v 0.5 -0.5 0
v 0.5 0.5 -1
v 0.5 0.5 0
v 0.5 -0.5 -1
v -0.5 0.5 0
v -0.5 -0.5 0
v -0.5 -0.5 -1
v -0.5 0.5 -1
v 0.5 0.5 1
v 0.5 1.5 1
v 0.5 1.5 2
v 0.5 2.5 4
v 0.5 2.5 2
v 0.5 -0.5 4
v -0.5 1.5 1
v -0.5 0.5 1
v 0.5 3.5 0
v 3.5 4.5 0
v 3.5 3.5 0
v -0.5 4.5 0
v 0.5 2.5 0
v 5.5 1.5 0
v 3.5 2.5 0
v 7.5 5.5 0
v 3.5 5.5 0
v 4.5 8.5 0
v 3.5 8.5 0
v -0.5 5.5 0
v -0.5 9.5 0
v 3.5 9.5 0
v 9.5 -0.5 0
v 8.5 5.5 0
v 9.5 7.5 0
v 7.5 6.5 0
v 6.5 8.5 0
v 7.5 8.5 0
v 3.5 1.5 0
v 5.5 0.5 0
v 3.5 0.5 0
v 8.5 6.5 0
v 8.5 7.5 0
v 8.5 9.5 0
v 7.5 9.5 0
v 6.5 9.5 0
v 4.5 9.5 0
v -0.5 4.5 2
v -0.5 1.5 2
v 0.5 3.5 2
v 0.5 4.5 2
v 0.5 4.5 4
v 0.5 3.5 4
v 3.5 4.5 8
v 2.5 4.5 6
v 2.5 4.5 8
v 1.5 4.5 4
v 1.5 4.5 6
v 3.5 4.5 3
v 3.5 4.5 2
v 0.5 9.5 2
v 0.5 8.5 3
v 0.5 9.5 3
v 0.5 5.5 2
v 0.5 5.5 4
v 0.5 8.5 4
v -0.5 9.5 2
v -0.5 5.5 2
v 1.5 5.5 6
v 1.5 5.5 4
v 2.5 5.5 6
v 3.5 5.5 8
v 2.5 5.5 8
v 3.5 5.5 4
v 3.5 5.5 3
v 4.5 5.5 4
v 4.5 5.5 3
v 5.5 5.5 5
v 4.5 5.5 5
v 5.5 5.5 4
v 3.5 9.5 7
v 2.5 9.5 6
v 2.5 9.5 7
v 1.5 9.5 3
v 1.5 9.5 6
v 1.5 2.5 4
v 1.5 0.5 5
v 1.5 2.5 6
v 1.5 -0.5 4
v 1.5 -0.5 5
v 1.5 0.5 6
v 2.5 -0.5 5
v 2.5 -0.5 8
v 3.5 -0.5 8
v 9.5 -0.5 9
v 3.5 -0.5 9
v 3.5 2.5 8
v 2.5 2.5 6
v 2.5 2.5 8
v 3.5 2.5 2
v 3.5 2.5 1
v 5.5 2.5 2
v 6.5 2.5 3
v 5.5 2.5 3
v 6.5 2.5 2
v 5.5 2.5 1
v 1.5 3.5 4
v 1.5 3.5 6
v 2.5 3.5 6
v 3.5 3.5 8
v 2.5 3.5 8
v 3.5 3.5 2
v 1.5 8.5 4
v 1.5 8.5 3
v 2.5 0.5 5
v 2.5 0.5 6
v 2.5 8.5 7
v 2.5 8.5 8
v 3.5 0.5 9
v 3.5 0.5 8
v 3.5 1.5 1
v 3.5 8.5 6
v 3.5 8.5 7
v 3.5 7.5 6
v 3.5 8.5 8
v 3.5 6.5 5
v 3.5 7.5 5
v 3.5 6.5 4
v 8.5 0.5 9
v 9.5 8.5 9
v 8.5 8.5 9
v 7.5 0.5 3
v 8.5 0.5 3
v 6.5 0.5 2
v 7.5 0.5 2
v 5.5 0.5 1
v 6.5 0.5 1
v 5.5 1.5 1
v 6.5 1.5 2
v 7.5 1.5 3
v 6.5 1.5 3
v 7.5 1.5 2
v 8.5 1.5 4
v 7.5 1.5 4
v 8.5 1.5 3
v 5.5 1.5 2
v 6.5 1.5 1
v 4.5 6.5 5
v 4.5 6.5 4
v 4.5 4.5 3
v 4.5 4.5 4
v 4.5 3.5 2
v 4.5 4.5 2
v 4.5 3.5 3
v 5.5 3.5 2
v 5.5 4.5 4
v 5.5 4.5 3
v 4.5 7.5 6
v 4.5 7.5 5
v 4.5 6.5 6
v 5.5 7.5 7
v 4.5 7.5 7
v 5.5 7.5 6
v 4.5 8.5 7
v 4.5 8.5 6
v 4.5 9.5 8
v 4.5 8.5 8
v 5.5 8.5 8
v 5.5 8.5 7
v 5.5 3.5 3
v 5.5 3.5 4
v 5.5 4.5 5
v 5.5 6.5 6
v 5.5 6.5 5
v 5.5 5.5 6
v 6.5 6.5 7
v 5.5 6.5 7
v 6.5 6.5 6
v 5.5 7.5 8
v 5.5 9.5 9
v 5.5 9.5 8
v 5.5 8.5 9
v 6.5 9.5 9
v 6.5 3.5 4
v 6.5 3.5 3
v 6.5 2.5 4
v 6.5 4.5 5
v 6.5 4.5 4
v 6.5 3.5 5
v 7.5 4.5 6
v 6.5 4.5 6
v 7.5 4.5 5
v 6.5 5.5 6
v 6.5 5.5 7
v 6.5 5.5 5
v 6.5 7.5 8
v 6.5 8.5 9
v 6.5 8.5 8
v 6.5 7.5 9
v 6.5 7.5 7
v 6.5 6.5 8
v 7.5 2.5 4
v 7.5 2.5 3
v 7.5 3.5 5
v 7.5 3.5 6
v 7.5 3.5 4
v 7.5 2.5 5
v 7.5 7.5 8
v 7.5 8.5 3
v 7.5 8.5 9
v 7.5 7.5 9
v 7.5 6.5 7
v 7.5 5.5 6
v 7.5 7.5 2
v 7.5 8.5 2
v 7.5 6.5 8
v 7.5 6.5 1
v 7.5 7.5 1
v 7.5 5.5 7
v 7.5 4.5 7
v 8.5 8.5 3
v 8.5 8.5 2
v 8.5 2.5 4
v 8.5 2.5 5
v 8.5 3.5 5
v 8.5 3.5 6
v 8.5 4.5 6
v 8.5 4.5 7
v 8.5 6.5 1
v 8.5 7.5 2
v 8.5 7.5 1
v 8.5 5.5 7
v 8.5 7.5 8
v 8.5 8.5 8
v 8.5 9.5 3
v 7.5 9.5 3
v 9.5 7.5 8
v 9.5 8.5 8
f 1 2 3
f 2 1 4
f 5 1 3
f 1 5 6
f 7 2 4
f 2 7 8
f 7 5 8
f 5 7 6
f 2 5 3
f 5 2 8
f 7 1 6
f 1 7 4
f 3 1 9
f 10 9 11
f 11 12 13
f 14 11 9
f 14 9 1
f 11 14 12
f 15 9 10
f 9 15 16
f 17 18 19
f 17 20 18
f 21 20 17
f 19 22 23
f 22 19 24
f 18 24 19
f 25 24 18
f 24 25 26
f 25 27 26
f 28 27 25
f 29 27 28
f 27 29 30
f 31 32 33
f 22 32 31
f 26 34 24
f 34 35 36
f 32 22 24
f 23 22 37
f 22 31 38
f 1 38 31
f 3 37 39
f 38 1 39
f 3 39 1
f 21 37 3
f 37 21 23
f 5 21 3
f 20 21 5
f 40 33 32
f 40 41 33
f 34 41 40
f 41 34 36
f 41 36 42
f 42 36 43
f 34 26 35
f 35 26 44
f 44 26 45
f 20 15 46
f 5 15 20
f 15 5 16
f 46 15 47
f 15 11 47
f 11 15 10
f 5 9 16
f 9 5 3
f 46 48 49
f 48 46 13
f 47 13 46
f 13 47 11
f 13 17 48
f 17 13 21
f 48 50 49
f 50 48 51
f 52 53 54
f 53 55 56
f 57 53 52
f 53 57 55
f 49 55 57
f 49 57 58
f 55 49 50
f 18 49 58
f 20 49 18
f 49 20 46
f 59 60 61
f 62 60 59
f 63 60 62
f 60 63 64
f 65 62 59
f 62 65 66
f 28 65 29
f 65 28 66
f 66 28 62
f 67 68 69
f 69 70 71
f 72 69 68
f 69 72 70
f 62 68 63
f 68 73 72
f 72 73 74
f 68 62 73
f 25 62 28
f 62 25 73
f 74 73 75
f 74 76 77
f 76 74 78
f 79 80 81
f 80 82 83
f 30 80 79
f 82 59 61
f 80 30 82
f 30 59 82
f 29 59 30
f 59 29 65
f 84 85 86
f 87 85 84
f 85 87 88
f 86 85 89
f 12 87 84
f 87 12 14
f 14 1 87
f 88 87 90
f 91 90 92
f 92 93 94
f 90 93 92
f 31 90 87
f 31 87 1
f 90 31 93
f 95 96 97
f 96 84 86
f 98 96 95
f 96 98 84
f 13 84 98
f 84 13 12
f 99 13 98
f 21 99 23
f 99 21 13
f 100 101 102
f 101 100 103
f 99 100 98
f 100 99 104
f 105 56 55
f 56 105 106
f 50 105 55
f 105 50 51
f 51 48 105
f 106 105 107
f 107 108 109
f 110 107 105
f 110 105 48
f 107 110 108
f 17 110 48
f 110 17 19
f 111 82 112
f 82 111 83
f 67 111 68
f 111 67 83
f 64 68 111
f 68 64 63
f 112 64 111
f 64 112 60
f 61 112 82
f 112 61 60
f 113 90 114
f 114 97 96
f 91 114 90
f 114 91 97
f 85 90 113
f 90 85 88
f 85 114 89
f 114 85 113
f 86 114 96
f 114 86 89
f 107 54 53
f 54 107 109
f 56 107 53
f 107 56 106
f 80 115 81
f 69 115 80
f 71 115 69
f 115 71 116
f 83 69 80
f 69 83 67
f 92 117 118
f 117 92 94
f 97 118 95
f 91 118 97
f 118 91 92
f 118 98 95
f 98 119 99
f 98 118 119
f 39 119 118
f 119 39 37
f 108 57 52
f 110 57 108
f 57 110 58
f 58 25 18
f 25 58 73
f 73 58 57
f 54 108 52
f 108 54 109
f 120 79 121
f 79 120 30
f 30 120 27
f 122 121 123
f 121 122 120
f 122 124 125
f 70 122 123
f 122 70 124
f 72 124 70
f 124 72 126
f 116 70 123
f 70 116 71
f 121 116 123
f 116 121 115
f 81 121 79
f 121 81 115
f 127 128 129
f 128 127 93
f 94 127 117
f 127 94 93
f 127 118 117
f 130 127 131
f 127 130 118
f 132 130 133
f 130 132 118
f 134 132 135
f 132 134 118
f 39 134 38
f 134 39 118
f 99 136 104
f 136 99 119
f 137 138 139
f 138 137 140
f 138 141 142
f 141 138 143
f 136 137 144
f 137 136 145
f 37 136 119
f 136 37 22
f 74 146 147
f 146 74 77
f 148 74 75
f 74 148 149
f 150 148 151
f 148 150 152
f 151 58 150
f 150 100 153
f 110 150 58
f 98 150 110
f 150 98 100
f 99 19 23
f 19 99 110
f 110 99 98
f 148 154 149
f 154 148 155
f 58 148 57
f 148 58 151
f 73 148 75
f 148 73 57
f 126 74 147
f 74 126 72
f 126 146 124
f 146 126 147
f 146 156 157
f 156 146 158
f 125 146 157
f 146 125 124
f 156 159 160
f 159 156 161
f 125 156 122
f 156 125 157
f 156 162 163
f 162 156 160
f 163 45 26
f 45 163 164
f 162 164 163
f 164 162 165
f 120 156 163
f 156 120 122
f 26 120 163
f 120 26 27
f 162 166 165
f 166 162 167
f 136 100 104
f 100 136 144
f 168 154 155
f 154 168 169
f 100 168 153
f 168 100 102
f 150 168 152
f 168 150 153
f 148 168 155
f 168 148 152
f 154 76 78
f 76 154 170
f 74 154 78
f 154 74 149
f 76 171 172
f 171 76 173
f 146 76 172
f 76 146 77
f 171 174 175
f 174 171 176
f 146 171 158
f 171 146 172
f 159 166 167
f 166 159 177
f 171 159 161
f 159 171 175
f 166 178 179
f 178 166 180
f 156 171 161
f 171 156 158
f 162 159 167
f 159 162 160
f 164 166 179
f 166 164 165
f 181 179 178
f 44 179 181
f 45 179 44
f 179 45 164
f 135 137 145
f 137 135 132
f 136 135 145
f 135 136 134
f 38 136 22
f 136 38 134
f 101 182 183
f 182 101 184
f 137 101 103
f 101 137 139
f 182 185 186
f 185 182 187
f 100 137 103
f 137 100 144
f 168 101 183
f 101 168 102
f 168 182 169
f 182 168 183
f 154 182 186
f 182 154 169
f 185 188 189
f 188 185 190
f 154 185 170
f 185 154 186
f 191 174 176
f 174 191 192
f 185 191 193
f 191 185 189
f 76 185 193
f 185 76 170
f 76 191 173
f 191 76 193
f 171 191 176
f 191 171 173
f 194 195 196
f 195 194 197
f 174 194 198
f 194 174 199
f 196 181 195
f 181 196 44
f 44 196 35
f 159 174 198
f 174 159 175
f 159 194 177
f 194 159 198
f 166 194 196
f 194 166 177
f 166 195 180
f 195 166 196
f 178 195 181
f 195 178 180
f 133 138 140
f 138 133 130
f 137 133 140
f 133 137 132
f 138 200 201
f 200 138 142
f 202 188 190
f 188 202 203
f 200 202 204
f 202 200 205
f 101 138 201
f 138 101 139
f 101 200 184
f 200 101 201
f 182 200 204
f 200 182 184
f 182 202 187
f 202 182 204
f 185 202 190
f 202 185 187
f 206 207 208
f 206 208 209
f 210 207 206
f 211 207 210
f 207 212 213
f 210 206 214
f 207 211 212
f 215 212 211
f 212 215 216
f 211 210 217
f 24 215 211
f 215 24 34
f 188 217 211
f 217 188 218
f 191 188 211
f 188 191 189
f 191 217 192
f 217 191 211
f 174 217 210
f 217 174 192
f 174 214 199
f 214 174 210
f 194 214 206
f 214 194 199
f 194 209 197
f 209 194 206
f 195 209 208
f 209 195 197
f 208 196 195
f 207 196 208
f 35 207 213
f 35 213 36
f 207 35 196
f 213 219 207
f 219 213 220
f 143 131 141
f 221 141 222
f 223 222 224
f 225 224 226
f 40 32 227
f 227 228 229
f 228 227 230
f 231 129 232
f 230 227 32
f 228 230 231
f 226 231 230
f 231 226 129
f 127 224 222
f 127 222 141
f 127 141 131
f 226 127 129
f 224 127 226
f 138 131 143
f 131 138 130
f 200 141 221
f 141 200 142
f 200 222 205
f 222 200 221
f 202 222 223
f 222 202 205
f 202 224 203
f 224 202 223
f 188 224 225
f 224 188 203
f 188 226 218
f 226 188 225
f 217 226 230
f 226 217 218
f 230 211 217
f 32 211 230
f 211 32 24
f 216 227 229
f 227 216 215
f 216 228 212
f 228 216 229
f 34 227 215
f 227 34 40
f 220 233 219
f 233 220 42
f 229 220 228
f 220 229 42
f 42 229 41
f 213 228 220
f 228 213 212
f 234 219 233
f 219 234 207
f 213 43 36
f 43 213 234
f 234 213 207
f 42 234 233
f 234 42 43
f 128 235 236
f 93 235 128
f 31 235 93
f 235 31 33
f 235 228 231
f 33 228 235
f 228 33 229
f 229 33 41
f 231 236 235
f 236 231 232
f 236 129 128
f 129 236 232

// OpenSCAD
union() {
    translate([0, 0, -0.5]) color([1, 0, 0]) cube([1, 1, 1], center=true);
    translate([0, 1, 0.5]) cube([1, 1, 1], center=true);
    translate([0, 2, 1.0]) cube([1, 1, 2], center=true);
    translate([0, 3, 1.0]) cube([1, 1, 2], center=true);
    translate([0, 4, 1.0]) cube([1, 1, 2], center=true);
    translate([0, 6, 1.0]) cube([1, 1, 2], center=true);
    translate([0, 7, 1.0]) cube([1, 1, 2], center=true);
    translate([0, 8, 1.0]) cube([1, 1, 2], center=true);
    translate([0, 9, 1.0]) cube([1, 1, 2], center=true);
    translate([1, 0, 2.0]) cube([1, 1, 4], center=true);
    translate([1, 1, 2.0]) cube([1, 1, 4], center=true);
    translate([1, 2, 2.0]) cube([1, 1, 4], center=true);
    translate([1, 4, 2.0]) cube([1, 1, 4], center=true);
    translate([1, 6, 2.0]) cube([1, 1, 4], center=true);
    translate([1, 7, 2.0]) cube([1, 1, 4], center=true);
    translate([1, 8, 2.0]) cube([1, 1, 4], center=true);
    translate([1, 9, 1.5]) cube([1, 1, 3], center=true);
    translate([2, 0, 2.5]) cube([1, 1, 5], center=true);
    translate([2, 1, 3.0]) cube([1, 1, 6], center=true);
    translate([2, 2, 3.0]) cube([1, 1, 6], center=true);
    translate([2, 4, 3.0]) cube([1, 1, 6], center=true);
    translate([2, 6, 3.0]) cube([1, 1, 6], center=true);
    translate([2, 7, 3.0]) cube([1, 1, 6], center=true);
    translate([2, 8, 3.0]) cube([1, 1, 6], center=true);
    translate([2, 9, 3.0]) cube([1, 1, 6], center=true);
    translate([3, 0, 4.0]) cube([1, 1, 8], center=true);
    translate([3, 1, 4.0]) cube([1, 1, 8], center=true);
    translate([3, 2, 4.0]) cube([1, 1, 8], center=true);
    translate([3, 4, 4.0]) cube([1, 1, 8], center=true);
    translate([3, 6, 4.0]) cube([1, 1, 8], center=true);
    translate([3, 7, 4.0]) cube([1, 1, 8], center=true);
    translate([3, 8, 4.0]) cube([1, 1, 8], center=true);
    translate([3, 9, 3.5]) cube([1, 1, 7], center=true);
    translate([4, 0, 4.5]) cube([1, 1, 9], center=true);
    translate([4, 2, 0.5]) cube([1, 1, 1], center=true);
    translate([4, 3, 1.0]) cube([1, 1, 2], center=true);
    translate([4, 4, 1.0]) cube([1, 1, 2], center=true);
    translate([4, 5, 1.5]) cube([1, 1, 3], center=true);
    translate([4, 6, 2.0]) cube([1, 1, 4], center=true);
    translate([4, 7, 2.5]) cube([1, 1, 5], center=true);
    translate([4, 8, 3.0]) cube([1, 1, 6], center=true);
    translate([5, 0, 4.5]) cube([1, 1, 9], center=true);
    translate([5, 2, 0.5]) cube([1, 1, 1], center=true);
    translate([5, 3, 1.0]) cube([1, 1, 2], center=true);
    translate([5, 4, 1.5]) cube([1, 1, 3], center=true);
    translate([5, 5, 2.0]) cube([1, 1, 4], center=true);
    translate([5, 6, 2.5]) cube([1, 1, 5], center=true);
    translate([5, 7, 3.0]) cube([1, 1, 6], center=true);
    translate([5, 8, 3.5]) cube([1, 1, 7], center=true);
    translate([5, 9, 4.0]) cube([1, 1, 8], center=true);
    translate([6, 0, 4.5]) cube([1, 1, 9], center=true);
    translate([6, 1, 0.5]) cube([1, 1, 1], center=true);
    translate([6, 2, 1.0]) cube([1, 1, 2], center=true);
    translate([6, 3, 1.5]) cube([1, 1, 3], center=true);
    translate([6, 4, 2.0]) cube([1, 1, 4], center=true);
    translate([6, 5, 2.5]) cube([1, 1, 5], center=true);
    translate([6, 6, 3.0]) cube([1, 1, 6], center=true);
    translate([6, 7, 3.5]) cube([1, 1, 7], center=true);
    translate([6, 8, 4.0]) cube([1, 1, 8], center=true);
    translate([6, 9, 4.5]) cube([1, 1, 9], center=true);
    translate([7, 0, 4.5]) cube([1, 1, 9], center=true);
    translate([7, 1, 1.0]) cube([1, 1, 2], center=true);
    translate([7, 2, 1.5]) cube([1, 1, 3], center=true);
    translate([7, 3, 2.0]) cube([1, 1, 4], center=true);
    translate([7, 4, 2.5]) cube([1, 1, 5], center=true);
    translate([7, 5, 3.0]) cube([1, 1, 6], center=true);
    translate([7, 6, 3.5]) cube([1, 1, 7], center=true);
    translate([7, 7, 4.0]) cube([1, 1, 8], center=true);
    translate([7, 8, 4.5]) cube([1, 1, 9], center=true);
    translate([8, 0, 4.5]) cube([1, 1, 9], center=true);
    translate([8, 1, 1.5]) cube([1, 1, 3], center=true);
    translate([8, 2, 2.0]) cube([1, 1, 4], center=true);
    translate([8, 3, 2.5]) cube([1, 1, 5], center=true);
    translate([8, 4, 3.0]) cube([1, 1, 6], center=true);
    translate([8, 5, 3.5]) cube([1, 1, 7], center=true);
    translate([8, 7, 0.5]) cube([1, 1, 1], center=true);
    translate([8, 8, 1.0]) cube([1, 1, 2], center=true);
    translate([8, 9, 1.5]) cube([1, 1, 3], center=true);
    translate([9, 0, 4.5]) cube([1, 1, 9], center=true);
    translate([9, 1, 4.5]) cube([1, 1, 9], center=true);
    translate([9, 2, 4.5]) cube([1, 1, 9], center=true);
    translate([9, 3, 4.5]) cube([1, 1, 9], center=true);
    translate([9, 4, 4.5]) cube([1, 1, 9], center=true);
    translate([9, 5, 4.5]) cube([1, 1, 9], center=true);
    translate([9, 6, 4.5]) cube([1, 1, 9], center=true);
    translate([9, 7, 4.5]) cube([1, 1, 9], center=true);
    translate([9, 8, 8.5]) color([0, 0, 1]) cube([1, 1, 1], center=true);
}
